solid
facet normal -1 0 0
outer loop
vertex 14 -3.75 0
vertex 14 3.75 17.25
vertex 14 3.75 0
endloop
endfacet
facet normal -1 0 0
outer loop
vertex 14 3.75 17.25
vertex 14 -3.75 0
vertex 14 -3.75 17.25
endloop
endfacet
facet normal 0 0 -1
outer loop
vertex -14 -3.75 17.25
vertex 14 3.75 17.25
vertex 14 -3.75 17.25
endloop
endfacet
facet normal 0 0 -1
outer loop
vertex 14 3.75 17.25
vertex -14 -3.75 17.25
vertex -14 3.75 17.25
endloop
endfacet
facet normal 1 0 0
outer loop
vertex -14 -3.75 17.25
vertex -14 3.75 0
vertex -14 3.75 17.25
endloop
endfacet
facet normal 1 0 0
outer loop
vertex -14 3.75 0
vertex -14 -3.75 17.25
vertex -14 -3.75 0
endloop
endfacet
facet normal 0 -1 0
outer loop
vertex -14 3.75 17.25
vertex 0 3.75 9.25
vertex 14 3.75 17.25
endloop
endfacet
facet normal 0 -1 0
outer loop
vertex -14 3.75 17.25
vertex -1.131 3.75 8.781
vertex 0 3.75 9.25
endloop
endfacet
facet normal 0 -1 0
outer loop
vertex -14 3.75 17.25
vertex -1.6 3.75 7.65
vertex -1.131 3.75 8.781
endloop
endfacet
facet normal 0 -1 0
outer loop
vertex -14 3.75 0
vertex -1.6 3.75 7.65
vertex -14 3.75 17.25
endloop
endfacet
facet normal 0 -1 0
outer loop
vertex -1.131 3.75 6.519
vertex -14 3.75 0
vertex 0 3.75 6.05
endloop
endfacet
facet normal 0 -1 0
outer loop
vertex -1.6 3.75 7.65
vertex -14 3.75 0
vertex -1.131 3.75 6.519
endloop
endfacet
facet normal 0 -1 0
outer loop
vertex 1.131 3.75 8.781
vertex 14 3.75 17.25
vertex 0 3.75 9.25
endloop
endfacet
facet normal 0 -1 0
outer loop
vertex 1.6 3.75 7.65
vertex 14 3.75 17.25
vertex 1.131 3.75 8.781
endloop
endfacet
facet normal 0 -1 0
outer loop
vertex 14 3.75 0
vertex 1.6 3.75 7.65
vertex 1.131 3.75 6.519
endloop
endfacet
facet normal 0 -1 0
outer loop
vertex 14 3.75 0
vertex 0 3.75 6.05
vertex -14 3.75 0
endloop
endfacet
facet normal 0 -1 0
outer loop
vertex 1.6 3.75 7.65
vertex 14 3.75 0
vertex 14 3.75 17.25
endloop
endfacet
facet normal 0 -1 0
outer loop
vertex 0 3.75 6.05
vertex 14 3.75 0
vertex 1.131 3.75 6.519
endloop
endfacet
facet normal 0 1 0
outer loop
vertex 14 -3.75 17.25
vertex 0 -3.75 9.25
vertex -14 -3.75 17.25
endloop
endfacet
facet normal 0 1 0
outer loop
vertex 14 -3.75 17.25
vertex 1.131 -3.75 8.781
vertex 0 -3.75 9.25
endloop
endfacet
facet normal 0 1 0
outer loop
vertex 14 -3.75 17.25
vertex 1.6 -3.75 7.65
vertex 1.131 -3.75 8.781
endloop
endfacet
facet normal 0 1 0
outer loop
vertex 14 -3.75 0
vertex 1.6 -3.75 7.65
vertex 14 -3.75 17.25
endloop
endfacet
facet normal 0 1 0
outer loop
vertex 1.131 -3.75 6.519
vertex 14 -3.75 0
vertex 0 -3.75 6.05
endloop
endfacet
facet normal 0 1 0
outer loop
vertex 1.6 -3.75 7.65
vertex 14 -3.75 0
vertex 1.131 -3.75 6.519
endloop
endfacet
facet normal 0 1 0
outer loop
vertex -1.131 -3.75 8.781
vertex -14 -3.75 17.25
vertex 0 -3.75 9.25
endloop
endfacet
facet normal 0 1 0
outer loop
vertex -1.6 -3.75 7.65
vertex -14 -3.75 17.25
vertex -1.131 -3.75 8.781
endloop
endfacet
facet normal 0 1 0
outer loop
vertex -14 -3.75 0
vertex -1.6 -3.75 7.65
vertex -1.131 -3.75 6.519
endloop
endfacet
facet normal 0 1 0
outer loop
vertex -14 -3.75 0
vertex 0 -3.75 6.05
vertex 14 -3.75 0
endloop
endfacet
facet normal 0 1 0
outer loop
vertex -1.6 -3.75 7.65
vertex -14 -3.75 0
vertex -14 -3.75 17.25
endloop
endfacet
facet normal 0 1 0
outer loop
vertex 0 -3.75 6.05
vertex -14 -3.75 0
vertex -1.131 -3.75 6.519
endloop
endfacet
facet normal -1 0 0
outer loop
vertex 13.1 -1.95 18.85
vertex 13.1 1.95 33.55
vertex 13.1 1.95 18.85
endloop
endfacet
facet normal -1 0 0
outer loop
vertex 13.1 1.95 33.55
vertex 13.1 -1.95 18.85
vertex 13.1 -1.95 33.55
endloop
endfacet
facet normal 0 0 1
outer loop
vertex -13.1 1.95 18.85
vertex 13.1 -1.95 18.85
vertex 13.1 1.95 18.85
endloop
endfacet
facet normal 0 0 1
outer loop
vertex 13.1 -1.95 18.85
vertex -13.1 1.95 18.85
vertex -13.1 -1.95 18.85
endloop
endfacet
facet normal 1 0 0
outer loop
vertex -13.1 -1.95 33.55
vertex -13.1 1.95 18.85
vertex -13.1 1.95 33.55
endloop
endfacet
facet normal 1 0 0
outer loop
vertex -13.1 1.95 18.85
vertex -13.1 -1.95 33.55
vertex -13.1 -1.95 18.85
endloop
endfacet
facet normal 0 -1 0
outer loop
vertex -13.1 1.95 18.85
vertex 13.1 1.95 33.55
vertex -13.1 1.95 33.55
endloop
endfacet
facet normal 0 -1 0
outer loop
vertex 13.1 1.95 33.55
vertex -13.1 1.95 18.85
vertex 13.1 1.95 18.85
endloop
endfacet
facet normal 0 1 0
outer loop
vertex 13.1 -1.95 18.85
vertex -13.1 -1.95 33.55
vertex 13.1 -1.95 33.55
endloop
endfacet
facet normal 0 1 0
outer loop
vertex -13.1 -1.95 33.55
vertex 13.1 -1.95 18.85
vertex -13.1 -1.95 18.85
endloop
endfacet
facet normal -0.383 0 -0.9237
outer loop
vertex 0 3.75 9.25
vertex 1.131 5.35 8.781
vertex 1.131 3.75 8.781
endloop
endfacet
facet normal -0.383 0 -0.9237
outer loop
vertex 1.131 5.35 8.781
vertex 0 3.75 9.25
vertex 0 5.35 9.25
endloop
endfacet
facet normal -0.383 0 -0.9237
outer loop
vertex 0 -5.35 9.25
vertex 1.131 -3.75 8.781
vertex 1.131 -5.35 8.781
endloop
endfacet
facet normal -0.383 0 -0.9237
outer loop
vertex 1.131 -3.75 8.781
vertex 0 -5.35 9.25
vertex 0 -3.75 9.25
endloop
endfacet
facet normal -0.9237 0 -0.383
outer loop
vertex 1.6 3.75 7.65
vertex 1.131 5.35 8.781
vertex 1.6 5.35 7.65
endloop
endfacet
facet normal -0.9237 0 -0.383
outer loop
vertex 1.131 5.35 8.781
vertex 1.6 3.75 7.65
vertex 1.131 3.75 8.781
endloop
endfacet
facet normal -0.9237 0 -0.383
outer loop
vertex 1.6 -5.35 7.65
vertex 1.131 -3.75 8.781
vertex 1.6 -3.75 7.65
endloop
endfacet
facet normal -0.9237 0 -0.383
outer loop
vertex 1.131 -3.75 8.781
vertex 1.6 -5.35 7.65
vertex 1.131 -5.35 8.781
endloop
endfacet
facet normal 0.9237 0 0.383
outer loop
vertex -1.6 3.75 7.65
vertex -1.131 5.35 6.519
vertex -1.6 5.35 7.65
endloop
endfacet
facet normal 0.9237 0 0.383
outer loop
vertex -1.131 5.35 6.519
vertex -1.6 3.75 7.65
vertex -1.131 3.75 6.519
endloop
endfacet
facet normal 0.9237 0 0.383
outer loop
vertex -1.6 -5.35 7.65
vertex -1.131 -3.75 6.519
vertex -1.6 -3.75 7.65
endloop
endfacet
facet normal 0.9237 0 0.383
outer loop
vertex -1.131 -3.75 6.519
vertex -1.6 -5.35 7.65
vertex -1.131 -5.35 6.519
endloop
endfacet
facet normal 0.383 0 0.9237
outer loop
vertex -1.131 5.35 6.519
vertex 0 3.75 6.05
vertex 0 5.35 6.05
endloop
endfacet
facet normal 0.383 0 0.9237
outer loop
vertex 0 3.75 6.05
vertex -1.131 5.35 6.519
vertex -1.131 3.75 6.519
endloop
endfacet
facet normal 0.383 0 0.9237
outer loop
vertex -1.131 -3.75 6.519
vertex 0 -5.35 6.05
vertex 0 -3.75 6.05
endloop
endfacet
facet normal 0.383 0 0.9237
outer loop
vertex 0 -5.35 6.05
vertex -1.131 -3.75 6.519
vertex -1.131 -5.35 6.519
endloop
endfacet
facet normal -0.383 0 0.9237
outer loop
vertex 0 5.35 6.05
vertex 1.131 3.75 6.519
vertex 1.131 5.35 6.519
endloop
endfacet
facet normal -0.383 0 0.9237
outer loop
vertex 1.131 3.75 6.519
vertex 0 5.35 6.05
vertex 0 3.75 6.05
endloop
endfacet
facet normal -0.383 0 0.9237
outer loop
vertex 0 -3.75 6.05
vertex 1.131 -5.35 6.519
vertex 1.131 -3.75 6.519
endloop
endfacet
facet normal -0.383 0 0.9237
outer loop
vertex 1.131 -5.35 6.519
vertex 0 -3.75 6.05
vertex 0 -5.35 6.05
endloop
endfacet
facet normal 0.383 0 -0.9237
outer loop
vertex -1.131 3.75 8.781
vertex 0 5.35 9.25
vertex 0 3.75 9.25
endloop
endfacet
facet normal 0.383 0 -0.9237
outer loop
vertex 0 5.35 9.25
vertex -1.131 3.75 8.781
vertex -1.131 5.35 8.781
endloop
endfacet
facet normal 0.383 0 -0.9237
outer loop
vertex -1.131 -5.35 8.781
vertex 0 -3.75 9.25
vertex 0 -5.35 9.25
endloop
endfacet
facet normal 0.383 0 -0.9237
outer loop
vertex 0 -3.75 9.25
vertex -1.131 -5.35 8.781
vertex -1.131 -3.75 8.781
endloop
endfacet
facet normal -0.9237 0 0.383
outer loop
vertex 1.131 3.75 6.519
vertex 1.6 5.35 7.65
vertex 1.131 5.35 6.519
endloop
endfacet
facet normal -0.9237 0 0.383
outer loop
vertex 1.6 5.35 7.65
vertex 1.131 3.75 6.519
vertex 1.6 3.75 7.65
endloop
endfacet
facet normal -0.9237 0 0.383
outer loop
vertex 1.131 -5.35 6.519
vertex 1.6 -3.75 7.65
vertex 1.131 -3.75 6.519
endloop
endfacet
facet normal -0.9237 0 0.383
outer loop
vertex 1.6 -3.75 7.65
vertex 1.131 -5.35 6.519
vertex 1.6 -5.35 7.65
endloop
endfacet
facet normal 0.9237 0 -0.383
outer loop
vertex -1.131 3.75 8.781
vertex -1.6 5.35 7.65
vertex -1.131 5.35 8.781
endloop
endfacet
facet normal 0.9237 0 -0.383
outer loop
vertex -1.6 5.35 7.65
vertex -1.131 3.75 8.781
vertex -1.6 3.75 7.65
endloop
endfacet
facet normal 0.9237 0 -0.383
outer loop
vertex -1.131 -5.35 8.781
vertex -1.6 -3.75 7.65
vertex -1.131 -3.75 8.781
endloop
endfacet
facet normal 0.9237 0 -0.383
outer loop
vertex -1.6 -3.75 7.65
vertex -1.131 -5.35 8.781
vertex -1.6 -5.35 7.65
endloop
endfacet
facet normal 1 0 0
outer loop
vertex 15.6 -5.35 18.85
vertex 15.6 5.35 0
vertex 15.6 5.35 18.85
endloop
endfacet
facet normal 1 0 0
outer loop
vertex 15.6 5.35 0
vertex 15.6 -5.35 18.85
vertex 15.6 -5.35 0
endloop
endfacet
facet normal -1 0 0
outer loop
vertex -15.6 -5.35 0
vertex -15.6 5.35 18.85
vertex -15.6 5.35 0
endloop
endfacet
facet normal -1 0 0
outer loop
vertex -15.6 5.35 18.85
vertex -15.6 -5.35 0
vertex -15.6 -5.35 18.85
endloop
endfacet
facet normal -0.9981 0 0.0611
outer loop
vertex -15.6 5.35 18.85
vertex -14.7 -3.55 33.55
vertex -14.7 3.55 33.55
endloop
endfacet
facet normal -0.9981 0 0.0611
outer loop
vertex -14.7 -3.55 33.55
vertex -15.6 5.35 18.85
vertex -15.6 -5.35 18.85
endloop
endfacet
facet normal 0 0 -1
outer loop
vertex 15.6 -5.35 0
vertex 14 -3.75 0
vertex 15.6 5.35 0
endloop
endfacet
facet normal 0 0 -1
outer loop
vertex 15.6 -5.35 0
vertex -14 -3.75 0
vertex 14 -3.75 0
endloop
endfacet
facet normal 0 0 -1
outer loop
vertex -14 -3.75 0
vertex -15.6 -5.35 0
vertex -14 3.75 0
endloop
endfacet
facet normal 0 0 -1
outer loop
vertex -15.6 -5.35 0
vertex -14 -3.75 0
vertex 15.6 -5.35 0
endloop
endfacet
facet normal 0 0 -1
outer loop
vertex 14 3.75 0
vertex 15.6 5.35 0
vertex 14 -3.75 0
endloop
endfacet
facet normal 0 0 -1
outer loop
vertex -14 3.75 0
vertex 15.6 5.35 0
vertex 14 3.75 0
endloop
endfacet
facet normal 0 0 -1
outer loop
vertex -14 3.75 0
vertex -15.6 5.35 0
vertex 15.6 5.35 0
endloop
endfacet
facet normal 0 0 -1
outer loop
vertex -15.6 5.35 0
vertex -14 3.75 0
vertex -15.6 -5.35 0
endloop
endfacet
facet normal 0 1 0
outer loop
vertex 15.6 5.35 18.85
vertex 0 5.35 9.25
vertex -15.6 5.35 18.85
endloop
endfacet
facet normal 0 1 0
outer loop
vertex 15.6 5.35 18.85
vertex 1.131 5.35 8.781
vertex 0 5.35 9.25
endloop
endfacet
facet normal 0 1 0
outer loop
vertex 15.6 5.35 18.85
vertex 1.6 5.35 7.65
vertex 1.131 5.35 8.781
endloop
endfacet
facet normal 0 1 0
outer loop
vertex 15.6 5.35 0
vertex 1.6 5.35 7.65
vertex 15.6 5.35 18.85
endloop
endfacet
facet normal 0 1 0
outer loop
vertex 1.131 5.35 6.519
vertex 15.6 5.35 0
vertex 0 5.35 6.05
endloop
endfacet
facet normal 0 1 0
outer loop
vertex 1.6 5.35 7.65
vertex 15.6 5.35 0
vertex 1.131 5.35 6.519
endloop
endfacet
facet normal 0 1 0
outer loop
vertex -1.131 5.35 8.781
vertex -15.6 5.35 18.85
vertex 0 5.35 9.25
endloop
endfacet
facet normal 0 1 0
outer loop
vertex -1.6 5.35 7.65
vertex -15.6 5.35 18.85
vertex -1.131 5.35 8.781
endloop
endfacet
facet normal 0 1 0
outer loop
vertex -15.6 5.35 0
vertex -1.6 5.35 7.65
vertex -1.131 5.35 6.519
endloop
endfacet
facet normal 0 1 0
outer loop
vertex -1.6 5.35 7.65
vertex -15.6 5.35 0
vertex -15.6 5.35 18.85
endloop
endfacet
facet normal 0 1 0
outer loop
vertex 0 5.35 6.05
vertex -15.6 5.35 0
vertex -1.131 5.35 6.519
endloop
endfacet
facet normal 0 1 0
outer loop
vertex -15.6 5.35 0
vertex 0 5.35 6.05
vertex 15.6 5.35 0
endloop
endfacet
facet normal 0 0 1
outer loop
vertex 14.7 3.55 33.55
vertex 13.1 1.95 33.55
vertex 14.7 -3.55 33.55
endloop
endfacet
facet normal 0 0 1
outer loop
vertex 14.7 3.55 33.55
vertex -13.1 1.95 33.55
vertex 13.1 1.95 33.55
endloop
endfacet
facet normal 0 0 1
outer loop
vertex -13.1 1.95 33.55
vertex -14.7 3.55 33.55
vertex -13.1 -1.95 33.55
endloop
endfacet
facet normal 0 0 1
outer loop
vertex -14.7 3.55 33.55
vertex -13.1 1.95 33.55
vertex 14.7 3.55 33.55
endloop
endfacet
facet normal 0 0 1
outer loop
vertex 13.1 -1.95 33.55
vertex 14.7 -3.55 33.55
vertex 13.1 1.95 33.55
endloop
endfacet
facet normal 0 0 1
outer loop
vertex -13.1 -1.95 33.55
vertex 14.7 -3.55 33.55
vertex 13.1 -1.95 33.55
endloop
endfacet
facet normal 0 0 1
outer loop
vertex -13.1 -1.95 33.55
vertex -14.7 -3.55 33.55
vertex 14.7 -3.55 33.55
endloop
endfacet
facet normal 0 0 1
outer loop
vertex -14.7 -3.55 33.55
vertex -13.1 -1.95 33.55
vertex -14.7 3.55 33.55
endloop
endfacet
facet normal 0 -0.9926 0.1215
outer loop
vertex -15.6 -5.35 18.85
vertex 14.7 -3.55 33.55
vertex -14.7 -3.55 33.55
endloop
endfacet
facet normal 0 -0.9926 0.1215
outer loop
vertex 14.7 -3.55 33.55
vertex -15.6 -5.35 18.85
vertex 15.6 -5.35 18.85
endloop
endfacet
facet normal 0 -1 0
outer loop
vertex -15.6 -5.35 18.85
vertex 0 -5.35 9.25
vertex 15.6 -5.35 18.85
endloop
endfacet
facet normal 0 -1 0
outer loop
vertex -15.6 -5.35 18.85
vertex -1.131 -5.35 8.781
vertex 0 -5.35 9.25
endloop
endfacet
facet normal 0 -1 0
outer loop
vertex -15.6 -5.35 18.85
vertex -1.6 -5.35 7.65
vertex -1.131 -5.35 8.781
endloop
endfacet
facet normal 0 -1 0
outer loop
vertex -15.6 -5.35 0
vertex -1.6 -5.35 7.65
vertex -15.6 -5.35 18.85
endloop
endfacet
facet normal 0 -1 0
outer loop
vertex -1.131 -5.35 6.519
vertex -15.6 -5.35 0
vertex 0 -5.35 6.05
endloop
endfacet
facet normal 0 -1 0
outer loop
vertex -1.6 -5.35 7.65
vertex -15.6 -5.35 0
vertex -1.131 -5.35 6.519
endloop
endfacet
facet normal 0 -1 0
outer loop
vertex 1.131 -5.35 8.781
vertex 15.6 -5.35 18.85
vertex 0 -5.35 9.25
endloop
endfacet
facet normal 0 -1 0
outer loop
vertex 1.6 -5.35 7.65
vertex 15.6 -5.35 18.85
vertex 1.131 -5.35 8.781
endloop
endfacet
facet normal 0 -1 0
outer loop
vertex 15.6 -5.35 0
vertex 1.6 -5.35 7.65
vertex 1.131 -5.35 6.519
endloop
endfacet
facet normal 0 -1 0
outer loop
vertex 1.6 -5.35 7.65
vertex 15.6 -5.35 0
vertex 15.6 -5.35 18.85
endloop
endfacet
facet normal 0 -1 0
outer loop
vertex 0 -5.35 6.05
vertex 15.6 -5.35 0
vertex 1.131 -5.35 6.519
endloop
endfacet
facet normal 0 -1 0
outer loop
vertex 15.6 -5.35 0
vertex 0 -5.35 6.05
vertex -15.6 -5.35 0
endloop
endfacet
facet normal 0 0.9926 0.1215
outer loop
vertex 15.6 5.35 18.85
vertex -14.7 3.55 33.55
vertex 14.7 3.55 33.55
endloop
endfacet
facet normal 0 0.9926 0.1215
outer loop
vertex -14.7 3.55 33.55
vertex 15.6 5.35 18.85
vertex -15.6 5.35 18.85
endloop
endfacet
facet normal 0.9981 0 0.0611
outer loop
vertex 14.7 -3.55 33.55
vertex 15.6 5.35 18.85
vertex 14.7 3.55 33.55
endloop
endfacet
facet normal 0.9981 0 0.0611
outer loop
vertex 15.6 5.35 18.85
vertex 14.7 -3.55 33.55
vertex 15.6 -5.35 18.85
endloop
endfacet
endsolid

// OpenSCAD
// Fix for toy costume sword.

render_part="scabbard2blade_body";
render_part="scabbard2blade_holes";
render_part="scabbard2blade";

scabbard_w=28.0;
scabbard_h=7.5;
scabbard_l=17.25;
scabbard_bolt_offset=8.0;
scabbard_bolt_d=3.2;

blade_w=26.2;
blade_h=3.9;
blade_l=14.7;
global_wall_th=0.4;

module scabbard2blade_body(wall_th=0.4
    ,scab_w=scabbard_w,scab_h=scabbard_h,scab_l=scabbard_l
    ,scab_bolt_offset=scabbard_bolt_offset,scab_bolt_d=scabbard_bolt_d
    ,blade_w=blade_w,blade_h=blade_h,blade_l=blade_l
    ) {
  hull() {
    translate([-(scab_w+2*wall_th)/2,-(scab_h+2*wall_th)/2]) cube([scab_w+2*wall_th,scab_h+2*wall_th,scab_l+wall_th],center=false);
    translate([-(blade_w+2*wall_th)/2,-(blade_h+2*wall_th)/2,scab_l+wall_th]) cube([blade_w+2*wall_th,blade_h+2*wall_th,blade_l],center=false);
  }
}

if(render_part=="scabbard2blade_body") {
    scabbard2blade_body();
}

module scabbard2blade_holes(wall_th=0.4
    ,scab_w=scabbard_w,scab_h=scabbard_h,scab_l=scabbard_l
    ,scab_bolt_offset=scabbard_bolt_offset,scab_bolt_d=scabbard_bolt_d
    ,blade_w=blade_w,blade_h=blade_h,blade_l=blade_l
    ,extend_bottom=0.1,extend_top=0.1
    ) {
    translate([-scab_w/2,-scab_h/2,-extend_bottom]) cube([scab_w,scab_h,scab_l+extend_bottom],center=false);
    translate([-blade_w/2,-blade_h/2,scab_l+wall_th]) cube([blade_w,blade_h,blade_l+extend_top],center=false);
    translate([0,0,scab_l-scab_bolt_offset-scab_bolt_d/2]) rotate([90,0,0]) cylinder(r=scab_bolt_d/2,h=2*scab_w,center=true,$fn=8);
}

if(render_part=="scabbard2blade_holes") {
    scabbard2blade_holes();
}

module scabbard2blade(wall_th=0.4
    ,scab_w=scabbard_w,scab_h=scabbard_h,scab_l=scabbard_l
    ,scab_bolt_offset=scabbard_bolt_offset,scab_bolt_d=scabbard_bolt_d
    ,blade_w=blade_w,blade_h=blade_h,blade_l=blade_l
    ,extend_bottom=0.1,extend_top=0.1
    ) {
  difference() {
    scabbard2blade_body(wall_th=wall_th,scab_w=scab_w,scab_h=scab_h,scab_l=scab_l,scab_bolt_offset=scab_bolt_offset,scab_bolt_d=scab_bolt_d
        ,blade_w=blade_w,blade_h=blade_h,blade_l=blade_l);
    scabbard2blade_holes(wall_th=wall_th,scab_w=scab_w,scab_h=scab_h,scab_l=scab_l,scab_bolt_offset=scab_bolt_offset,scab_bolt_d=scab_bolt_d
        ,blade_w=blade_w,blade_h=blade_h,blade_l=blade_l,extend_bottom=extend_bottom,extend_top=extend_top);
  }
}

if(render_part=="scabbard2blade") {
    scabbard2blade(wall_th=4*global_wall_th);
}
